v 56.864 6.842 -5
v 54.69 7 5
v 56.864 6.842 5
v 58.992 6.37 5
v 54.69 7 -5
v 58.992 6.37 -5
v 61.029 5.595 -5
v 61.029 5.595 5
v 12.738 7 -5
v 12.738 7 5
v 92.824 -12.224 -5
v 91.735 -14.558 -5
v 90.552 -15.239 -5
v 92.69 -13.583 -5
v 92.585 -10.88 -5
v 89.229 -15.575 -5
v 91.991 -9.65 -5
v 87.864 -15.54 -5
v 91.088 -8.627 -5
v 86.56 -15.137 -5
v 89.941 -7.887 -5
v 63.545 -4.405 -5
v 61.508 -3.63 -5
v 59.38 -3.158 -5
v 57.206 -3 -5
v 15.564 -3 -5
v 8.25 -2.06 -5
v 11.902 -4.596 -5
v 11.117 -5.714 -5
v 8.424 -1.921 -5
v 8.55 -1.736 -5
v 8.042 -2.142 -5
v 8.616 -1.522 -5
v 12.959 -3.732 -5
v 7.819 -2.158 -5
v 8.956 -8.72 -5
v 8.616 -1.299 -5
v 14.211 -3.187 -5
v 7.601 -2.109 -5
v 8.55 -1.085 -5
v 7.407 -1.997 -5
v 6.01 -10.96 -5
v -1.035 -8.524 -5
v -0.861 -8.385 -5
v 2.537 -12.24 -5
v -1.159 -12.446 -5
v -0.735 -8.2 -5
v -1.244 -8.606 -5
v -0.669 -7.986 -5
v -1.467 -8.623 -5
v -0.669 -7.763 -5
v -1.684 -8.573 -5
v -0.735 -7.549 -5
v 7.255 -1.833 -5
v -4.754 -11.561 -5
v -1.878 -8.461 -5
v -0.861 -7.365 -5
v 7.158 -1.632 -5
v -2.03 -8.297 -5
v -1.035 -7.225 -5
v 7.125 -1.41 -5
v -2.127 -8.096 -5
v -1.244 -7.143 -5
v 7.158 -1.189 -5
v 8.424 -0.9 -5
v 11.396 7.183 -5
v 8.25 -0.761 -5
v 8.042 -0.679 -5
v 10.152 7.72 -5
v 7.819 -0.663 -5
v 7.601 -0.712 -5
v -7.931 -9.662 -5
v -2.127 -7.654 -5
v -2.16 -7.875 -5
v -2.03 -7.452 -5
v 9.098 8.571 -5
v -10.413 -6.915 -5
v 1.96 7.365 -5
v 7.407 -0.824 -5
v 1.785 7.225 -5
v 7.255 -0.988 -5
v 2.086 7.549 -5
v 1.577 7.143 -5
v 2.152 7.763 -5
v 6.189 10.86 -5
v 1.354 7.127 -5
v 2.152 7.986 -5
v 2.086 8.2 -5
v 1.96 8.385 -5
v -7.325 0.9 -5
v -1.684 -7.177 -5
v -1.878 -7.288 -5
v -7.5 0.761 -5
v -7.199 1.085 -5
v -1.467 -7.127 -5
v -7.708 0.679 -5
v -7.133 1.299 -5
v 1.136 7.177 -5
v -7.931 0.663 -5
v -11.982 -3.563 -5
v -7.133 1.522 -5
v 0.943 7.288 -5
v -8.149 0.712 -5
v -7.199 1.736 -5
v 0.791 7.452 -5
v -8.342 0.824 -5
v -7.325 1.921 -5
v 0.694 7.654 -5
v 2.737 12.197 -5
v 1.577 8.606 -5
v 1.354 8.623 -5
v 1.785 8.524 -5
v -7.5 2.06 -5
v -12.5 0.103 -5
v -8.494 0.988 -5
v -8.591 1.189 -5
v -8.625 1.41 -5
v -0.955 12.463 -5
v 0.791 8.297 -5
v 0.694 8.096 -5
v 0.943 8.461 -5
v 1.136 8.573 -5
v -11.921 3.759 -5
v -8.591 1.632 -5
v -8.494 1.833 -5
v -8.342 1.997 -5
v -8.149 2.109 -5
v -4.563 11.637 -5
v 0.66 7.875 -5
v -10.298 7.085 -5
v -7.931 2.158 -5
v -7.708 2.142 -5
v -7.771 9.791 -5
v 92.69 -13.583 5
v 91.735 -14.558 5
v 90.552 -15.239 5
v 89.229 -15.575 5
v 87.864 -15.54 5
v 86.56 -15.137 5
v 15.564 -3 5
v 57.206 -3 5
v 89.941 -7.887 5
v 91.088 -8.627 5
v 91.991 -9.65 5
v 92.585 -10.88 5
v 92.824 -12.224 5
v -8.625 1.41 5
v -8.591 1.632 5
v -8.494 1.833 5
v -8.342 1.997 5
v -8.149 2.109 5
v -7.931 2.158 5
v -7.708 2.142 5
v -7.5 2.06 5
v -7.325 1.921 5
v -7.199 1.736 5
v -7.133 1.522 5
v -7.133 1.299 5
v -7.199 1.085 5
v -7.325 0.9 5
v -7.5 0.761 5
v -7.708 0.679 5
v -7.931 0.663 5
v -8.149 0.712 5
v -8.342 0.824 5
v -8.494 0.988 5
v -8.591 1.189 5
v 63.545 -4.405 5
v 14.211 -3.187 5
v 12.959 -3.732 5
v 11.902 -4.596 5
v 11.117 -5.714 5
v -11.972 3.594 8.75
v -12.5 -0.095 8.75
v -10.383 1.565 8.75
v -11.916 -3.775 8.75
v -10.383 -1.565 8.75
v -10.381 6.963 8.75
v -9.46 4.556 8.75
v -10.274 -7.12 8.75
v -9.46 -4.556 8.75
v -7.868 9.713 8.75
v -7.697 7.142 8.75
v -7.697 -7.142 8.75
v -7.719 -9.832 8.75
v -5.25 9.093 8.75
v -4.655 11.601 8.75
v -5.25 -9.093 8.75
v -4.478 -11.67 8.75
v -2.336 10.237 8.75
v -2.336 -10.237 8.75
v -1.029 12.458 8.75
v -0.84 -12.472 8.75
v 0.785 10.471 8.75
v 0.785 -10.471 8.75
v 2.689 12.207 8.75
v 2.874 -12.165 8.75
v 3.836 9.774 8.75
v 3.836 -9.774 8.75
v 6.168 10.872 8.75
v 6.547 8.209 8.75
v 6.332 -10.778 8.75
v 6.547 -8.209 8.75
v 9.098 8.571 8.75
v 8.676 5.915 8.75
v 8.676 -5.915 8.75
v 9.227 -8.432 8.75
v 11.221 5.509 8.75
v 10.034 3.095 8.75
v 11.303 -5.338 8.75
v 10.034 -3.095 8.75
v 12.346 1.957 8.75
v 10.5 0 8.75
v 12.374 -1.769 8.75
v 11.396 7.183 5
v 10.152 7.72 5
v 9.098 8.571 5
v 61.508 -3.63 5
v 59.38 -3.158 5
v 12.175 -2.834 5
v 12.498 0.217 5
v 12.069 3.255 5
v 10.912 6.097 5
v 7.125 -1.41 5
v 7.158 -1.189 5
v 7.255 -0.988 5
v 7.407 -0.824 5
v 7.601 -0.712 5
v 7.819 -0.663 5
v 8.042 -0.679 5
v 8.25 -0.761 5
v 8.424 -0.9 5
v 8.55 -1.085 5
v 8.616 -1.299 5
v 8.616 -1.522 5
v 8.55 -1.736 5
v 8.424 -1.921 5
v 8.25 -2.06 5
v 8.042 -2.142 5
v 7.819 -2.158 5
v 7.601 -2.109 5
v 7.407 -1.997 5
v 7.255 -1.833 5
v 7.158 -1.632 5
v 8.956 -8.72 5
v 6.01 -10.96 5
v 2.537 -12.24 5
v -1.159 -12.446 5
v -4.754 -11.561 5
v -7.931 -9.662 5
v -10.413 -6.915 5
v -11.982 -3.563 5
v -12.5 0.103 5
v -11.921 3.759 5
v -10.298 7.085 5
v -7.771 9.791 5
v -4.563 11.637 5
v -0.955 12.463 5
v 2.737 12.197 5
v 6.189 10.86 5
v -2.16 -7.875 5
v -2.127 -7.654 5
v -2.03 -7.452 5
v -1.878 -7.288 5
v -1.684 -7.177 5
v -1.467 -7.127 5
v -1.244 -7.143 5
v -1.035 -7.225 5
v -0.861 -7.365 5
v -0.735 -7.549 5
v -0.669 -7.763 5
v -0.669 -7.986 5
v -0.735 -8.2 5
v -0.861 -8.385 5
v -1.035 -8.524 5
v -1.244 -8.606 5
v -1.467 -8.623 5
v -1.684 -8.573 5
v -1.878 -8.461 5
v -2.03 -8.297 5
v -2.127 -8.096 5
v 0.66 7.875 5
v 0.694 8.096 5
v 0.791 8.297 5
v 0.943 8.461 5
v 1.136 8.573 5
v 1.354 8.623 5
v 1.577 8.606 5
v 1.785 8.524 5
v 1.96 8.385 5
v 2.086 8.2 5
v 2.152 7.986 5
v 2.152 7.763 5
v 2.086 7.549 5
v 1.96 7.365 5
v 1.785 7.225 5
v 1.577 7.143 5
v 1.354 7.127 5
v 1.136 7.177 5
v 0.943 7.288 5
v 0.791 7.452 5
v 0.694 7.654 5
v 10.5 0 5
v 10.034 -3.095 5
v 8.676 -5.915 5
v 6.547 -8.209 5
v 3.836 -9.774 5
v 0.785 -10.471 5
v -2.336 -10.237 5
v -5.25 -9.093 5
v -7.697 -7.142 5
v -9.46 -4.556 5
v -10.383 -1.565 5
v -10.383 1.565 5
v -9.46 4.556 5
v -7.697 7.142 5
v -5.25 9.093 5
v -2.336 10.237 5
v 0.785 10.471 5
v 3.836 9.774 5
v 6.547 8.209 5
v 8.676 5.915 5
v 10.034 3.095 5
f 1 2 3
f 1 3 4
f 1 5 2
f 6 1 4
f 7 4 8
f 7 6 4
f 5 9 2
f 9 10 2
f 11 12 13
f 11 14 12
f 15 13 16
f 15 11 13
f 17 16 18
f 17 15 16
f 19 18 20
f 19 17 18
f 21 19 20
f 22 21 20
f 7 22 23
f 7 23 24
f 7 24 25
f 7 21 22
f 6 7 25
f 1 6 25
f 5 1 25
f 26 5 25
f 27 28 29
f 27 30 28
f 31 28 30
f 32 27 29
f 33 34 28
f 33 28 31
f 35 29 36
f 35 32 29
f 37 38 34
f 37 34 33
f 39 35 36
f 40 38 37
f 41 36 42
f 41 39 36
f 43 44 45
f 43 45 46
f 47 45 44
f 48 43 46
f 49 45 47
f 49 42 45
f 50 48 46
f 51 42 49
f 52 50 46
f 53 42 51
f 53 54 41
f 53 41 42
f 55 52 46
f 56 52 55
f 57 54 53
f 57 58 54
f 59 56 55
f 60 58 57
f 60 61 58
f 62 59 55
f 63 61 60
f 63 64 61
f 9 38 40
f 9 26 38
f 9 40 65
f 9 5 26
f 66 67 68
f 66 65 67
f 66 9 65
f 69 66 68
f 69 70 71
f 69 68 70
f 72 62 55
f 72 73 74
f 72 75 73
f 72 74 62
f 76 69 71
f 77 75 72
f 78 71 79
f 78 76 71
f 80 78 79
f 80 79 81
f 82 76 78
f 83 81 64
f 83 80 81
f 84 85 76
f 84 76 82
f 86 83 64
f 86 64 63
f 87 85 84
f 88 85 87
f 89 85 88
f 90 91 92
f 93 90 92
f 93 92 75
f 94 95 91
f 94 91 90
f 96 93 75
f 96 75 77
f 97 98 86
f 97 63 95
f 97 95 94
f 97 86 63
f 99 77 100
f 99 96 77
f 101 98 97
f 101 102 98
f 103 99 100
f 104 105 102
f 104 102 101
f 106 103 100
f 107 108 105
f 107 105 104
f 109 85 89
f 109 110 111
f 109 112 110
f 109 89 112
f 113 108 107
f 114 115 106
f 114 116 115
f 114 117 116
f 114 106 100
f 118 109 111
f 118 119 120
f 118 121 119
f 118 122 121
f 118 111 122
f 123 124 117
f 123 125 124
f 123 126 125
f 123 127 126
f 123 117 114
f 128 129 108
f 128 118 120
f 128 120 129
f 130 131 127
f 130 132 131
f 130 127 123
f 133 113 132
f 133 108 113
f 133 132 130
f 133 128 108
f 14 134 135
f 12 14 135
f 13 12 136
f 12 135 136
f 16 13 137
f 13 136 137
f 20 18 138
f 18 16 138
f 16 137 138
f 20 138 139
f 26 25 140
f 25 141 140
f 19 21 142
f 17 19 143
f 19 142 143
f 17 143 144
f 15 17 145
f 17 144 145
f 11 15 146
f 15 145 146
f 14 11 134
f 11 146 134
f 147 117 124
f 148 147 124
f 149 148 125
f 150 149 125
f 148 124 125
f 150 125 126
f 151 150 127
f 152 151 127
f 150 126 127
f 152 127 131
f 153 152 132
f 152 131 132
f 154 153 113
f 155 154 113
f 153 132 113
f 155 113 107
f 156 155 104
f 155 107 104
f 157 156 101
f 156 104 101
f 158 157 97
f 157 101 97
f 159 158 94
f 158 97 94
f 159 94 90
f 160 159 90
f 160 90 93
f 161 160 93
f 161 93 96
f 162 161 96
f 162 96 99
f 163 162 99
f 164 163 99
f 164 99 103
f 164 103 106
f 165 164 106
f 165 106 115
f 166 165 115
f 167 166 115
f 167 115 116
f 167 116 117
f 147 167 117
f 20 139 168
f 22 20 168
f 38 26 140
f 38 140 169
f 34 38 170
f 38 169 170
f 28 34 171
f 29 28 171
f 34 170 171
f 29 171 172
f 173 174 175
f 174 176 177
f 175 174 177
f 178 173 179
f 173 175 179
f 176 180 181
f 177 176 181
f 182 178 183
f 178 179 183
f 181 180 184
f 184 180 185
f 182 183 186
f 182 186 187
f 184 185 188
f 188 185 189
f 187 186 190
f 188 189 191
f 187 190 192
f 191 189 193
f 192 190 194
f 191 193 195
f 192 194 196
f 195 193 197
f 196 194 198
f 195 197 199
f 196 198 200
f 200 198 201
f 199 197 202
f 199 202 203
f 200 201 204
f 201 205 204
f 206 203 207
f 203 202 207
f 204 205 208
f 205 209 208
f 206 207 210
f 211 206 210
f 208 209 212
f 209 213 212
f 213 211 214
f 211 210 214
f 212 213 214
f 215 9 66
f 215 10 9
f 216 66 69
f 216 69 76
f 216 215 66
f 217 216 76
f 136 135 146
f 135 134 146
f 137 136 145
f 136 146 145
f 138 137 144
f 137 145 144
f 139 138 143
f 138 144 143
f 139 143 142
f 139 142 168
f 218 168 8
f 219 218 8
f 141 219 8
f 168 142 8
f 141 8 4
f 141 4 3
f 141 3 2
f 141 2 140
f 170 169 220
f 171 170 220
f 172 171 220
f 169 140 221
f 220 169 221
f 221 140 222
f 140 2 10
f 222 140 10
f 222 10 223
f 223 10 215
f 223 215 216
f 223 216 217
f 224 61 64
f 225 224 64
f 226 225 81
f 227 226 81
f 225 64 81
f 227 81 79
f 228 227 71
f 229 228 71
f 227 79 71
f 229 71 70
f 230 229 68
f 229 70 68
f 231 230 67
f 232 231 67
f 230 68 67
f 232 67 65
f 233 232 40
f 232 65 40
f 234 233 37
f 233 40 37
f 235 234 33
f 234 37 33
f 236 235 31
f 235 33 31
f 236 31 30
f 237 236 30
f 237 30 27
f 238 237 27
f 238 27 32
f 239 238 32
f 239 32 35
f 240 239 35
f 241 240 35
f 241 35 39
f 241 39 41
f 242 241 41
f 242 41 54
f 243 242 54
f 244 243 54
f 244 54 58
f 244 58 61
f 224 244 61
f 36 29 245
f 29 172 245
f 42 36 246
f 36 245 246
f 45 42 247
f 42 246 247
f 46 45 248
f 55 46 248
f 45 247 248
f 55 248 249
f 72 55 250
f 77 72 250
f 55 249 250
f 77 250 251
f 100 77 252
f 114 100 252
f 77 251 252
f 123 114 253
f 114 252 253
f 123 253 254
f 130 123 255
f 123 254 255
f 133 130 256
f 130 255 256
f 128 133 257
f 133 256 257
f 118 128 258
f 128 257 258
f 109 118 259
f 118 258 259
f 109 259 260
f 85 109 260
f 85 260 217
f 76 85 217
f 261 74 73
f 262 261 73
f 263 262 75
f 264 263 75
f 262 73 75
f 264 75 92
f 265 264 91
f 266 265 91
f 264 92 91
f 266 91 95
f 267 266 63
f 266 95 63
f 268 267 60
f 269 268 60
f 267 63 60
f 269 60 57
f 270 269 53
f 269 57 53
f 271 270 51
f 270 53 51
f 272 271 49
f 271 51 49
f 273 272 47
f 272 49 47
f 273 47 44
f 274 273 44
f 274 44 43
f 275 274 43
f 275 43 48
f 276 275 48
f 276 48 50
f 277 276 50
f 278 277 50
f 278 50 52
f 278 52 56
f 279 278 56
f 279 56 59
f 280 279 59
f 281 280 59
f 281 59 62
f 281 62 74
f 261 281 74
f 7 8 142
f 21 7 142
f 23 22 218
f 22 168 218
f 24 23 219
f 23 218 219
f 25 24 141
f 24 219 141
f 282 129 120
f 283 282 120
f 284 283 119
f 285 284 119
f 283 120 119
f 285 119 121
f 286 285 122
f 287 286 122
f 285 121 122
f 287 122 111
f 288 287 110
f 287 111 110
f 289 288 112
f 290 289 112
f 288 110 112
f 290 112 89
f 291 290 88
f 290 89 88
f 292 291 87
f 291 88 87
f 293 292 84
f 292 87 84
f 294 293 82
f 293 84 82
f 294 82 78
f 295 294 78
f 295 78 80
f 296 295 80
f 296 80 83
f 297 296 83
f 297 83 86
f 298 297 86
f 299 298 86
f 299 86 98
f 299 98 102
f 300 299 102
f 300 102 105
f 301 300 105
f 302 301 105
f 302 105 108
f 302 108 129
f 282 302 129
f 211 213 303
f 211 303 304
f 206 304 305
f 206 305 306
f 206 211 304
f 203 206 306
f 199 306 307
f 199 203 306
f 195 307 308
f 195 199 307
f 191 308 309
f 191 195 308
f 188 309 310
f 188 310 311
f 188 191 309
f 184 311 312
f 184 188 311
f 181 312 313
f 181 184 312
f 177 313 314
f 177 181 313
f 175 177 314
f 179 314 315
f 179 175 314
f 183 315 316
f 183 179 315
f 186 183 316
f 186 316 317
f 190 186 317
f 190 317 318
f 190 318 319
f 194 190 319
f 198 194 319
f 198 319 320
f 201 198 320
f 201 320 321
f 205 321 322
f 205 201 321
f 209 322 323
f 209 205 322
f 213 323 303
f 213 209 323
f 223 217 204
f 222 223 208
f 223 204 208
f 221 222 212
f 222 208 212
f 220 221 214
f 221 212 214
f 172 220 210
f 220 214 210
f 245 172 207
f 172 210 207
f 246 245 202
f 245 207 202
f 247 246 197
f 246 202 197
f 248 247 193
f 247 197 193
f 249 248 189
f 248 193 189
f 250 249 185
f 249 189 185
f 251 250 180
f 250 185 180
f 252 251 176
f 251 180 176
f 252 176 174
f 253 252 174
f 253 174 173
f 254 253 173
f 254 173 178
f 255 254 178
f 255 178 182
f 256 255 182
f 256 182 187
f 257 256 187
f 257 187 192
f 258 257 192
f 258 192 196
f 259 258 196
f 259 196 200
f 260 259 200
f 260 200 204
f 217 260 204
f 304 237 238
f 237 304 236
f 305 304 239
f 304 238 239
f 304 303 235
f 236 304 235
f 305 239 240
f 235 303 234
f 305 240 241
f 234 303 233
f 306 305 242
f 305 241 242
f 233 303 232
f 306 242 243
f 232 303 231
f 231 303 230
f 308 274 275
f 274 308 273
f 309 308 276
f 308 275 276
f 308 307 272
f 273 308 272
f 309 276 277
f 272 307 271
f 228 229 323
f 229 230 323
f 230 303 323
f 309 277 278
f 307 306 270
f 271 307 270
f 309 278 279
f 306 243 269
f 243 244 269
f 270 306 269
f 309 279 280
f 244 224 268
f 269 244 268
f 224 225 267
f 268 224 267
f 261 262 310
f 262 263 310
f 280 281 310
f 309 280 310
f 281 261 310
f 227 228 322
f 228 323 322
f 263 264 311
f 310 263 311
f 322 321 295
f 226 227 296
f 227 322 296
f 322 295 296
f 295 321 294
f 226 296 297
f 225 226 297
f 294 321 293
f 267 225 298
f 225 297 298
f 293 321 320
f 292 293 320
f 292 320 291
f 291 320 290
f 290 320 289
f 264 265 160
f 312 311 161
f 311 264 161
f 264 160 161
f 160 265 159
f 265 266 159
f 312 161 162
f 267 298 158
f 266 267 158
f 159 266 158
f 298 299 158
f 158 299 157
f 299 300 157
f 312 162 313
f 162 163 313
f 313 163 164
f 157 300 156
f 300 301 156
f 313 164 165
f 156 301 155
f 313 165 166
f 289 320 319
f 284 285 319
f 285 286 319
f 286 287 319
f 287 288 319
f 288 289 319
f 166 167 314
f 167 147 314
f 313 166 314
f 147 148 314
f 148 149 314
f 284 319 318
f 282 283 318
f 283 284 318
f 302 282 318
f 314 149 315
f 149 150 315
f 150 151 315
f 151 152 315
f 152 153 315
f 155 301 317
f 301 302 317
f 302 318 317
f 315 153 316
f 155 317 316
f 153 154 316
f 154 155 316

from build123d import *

# Parameters (mm, degrees)
BOSS_EXTRU_1_DEPTH  = 5
CONG_4_R            = 5
CONG_3_R            = 15
CONG_6_R            = 5
SKETCH4_R           = 0.75
CUT_EXTRUDE5_DEPTH  = 95.659933807
BOSS_EXTRUDE1_START = -13.75
SKETCH5_R           = 12.5
SKETCH5_R_2         = 10.5
BOSS_EXTRUDE1_DEPTH = 3.75


with BuildPart() as part:
    # Esquisse1 → Boss.-Extru.1 (new, symmetric)
    with BuildSketch(Plane.XY):
        with BuildLine():
            Line((10.356157589, 7), (58.01560049, 7))
            Line((58.01560049, 7), (94.472218138, -10))
            Line((94.472218138, -10), (91.091272045, -17.250462296))
            Line((91.091272045, -17.250462296), (60.53105703, -3))
            Line((60.53105703, -3), (12.1346611, -3))
            ThreePointArc((12.1346611, -3), (-12.306877399, -2.188782466), (10.356157589, 7))
        make_face()
    extrude(amount=BOSS_EXTRU_1_DEPTH, both=True)

    # Congé4
    cong_4_edges = [part.edges().sort_by_distance(p)[0] for p in [
        (12.1346611, -3, 0),
        (10.356157589, 7, 0),
    ]]
    fillet(cong_4_edges, radius=CONG_4_R)

    # Congé3
    cong_3_edges = [part.edges().sort_by_distance(p)[0] for p in [
        (60.53105703, -3, 0),
        (58.01560049, 7, 0),
    ]]
    fillet(cong_3_edges, radius=CONG_3_R)

    # Congé6
    # the kernel refuses this fillet: 5 mm, written as the material it takes off along each edge
    with BuildSketch(Plane(origin=(94.472218138, -10, 17.5), x_dir=(-0.906307787036649, 0.4226182617407012, 0), z_dir=(0, 0, -1)), Plane(origin=(91.091272045, -17.250462296, 17.5), x_dir=(0.4226182617407007, 0.9063077870366493, 0), z_dir=(0, 0, -1))) as cong_6_piece_1:
        with BuildLine():
            CenterArc((CONG_6_R, -CONG_6_R), CONG_6_R, 90, 90)
            Line((0, -CONG_6_R), (0, 0))
            Line((0, 0), (CONG_6_R, 0))
        make_face()
    extrude(amount=35, mode=Mode.SUBTRACT)

    # Sketch4 → Cut-Extrude5 (cut, through all)
    with BuildSketch(Plane(origin=(0, 0, -5), x_dir=(-1, 0, 0), z_dir=(0, 0, -1))):
        with Locations((-1.410466322, 7.874679978)):
            Circle(SKETCH4_R)
        with Locations((7.874679978, 1.410466322)):
            Circle(SKETCH4_R)
        with Locations((1.410466322, -7.874679978)):
            Circle(SKETCH4_R)
        with Locations((-7.874679978, -1.410466322)):
            Circle(SKETCH4_R)
    extrude(amount=-CUT_EXTRUDE5_DEPTH, mode=Mode.SUBTRACT)

    # Sketch5 → Boss-Extrude1 (add)
    with BuildSketch(Plane(origin=(0, 0, -5), x_dir=(-1, 0, 0), z_dir=(0, 0, -1)).offset(BOSS_EXTRUDE1_START)):
        with Locations(Location((0, 0, 0), (0, 0, 136.708192407))):
            Circle(SKETCH5_R)
        with Locations(Location((0, 0, 0), (0, 0, 180))):
            Circle(SKETCH5_R_2, mode=Mode.SUBTRACT)
    extrude(amount=BOSS_EXTRUDE1_DEPTH)


solid = part.part
